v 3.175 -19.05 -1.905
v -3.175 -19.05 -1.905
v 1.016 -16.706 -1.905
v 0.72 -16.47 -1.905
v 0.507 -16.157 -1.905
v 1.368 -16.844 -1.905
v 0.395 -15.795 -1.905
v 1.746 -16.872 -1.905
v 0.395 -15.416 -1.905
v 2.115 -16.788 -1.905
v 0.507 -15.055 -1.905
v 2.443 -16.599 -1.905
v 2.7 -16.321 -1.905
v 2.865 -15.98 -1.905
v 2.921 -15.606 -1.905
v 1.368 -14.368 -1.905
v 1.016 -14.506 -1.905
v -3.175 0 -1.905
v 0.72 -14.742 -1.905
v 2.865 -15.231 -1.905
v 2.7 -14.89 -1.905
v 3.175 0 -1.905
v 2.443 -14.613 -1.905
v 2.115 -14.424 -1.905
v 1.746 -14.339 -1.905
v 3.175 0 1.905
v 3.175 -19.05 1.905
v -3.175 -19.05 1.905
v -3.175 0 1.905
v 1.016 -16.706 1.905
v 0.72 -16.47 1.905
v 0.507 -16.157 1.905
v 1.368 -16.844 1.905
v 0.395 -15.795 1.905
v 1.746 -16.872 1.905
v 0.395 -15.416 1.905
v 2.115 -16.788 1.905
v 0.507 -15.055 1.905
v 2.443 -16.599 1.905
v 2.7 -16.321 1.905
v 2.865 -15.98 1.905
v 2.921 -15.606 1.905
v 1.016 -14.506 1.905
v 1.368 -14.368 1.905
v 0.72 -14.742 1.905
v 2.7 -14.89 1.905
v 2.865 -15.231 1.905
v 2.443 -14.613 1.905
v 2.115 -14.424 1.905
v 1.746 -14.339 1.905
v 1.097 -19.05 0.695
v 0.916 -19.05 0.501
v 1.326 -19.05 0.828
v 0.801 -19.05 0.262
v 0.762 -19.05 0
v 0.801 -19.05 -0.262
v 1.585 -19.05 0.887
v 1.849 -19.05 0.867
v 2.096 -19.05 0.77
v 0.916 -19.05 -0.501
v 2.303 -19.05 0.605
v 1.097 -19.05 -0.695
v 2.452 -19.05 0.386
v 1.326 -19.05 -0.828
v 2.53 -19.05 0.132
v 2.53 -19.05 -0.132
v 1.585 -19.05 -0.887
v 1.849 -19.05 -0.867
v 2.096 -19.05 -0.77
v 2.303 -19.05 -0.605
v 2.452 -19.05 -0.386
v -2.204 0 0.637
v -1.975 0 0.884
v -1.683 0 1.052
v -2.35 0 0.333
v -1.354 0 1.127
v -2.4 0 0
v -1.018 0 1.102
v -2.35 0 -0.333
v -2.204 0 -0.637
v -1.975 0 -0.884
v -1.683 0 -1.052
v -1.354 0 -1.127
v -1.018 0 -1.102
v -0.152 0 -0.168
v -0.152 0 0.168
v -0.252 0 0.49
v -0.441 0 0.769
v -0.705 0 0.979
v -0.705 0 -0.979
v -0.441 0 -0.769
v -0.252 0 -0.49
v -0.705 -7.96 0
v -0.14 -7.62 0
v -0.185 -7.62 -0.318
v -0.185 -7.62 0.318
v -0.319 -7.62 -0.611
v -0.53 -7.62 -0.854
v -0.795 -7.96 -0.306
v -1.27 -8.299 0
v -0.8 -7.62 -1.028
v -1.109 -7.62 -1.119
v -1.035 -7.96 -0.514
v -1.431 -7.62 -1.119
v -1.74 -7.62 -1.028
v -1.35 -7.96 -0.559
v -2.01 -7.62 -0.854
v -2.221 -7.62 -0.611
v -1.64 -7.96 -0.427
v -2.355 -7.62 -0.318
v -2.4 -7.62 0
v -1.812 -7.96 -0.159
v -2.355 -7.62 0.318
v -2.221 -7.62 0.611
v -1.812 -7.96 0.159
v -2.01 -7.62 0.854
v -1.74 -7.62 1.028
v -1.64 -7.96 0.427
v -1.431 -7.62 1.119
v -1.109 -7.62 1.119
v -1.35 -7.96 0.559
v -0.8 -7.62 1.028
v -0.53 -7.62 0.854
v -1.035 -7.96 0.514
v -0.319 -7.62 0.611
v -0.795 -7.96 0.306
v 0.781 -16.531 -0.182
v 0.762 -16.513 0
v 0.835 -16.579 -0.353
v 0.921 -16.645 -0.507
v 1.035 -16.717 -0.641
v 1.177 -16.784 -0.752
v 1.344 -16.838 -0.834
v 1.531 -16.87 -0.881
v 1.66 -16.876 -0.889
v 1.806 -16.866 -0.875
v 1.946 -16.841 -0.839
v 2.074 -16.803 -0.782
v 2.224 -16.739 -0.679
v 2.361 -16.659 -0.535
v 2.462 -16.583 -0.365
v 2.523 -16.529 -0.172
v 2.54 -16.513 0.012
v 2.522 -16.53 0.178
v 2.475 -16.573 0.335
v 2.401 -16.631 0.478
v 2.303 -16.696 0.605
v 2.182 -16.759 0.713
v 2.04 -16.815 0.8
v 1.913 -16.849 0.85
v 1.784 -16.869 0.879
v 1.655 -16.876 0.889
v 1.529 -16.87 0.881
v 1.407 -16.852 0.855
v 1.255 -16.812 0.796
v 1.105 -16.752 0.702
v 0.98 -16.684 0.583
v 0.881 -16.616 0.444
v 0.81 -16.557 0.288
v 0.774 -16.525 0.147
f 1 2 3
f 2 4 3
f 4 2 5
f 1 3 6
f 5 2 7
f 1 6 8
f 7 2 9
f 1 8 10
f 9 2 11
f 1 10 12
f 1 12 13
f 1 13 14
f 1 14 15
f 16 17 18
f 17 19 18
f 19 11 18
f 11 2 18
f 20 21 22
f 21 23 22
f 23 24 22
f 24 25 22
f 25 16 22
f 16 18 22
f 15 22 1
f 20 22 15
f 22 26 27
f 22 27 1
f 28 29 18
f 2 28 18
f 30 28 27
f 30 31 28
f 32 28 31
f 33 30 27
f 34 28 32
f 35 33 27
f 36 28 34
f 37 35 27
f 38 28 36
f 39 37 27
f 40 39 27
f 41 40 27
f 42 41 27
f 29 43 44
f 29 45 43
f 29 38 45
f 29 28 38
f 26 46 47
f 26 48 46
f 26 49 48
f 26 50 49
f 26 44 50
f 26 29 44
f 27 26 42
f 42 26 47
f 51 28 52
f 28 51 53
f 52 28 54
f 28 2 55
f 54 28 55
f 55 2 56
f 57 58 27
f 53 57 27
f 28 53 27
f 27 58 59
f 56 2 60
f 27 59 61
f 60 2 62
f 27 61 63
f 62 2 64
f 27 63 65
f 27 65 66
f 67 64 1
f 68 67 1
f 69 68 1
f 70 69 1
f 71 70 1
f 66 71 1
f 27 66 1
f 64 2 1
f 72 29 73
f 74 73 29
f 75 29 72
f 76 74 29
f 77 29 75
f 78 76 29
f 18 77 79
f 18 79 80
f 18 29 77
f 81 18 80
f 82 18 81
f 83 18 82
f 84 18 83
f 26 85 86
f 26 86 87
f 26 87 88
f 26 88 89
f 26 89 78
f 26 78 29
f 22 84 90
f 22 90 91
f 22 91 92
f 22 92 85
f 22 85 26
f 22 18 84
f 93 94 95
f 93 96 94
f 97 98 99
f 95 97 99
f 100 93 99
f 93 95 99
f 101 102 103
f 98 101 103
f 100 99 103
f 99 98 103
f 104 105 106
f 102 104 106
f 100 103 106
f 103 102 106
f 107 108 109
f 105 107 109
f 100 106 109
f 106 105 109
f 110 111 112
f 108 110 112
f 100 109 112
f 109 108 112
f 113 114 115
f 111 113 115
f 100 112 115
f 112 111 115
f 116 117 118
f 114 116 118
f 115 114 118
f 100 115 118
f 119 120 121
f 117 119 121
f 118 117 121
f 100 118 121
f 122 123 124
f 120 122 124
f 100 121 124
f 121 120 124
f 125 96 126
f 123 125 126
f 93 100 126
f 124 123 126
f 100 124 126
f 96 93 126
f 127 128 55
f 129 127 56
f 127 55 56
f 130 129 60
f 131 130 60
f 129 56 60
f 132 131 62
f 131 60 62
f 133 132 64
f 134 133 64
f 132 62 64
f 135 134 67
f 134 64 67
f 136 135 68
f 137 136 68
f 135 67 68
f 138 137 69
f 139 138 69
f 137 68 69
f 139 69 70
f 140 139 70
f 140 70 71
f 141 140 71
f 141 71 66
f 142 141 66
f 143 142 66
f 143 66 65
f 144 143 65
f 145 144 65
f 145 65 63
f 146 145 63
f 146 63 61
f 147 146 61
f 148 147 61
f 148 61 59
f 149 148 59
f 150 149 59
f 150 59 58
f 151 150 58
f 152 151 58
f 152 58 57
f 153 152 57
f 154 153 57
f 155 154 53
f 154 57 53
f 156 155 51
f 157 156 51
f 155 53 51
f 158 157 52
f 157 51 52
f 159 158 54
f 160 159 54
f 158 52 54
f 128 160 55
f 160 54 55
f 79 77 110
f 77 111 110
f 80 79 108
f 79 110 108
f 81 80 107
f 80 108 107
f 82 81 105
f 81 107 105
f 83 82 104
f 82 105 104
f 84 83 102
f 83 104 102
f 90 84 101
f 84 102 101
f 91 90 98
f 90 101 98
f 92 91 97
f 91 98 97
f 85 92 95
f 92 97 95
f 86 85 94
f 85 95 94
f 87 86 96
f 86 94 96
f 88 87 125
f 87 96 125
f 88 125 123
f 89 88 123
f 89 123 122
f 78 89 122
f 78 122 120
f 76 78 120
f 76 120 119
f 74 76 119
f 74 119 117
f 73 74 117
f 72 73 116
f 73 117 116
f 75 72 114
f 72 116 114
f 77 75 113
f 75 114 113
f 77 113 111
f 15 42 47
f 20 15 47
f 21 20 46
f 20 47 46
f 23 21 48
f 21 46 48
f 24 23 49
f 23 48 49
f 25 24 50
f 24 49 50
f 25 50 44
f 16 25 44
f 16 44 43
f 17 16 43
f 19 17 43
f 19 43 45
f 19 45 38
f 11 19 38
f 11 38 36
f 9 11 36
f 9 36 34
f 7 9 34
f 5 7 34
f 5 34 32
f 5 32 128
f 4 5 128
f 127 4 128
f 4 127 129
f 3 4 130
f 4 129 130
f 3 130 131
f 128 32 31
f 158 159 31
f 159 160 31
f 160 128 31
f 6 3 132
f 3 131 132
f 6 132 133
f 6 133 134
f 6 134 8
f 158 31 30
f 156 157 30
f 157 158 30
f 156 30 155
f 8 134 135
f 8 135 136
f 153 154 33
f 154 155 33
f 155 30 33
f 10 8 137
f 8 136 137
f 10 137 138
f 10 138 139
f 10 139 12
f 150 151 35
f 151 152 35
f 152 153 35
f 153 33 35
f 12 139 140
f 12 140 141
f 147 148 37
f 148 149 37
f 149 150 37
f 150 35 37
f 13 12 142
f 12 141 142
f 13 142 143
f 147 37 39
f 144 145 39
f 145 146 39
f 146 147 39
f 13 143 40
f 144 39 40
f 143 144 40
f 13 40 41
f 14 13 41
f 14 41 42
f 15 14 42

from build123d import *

# Parameters (mm, degrees)
SKETCH1_W                  = 6.35
SKETCH1_H                  = 3.81
BOSS_EXTRUDE1_DEPTH        = 19.05
F_4_40_TAPPED_HOLE1_D      = 2.2606
F_4_40_TAPPED_HOLE1_DEPTH  = 7.62
F_4_40_TAPPED_HOLE1_TIP    = 0.679152758
SKETCH8_R                  = 1.27
CUT_EXTRUDE3_DEPTH         = 20.685
F_2_56_TAPPED_HOLE2_REACH  = 21.406
F_2_56_TAPPED_HOLE2_BORE_R = 0.889


with BuildPart() as part:
    # Sketch1 → Boss-Extrude1 (new body)
    with BuildSketch(Plane(origin=(0, 0, 0), x_dir=(1, 0, 0), z_dir=(0, 1, 0))):
        Rectangle(SKETCH1_W, SKETCH1_H)
    extrude(amount=-BOSS_EXTRUDE1_DEPTH)

    # #4-40 Tapped Hole1
    with Locations(Plane(origin=(0, 0, 0), x_dir=(1, 0, 0), z_dir=(0, 1, 0))):
        with Locations((-1.27, 0)):
            Hole(F_4_40_TAPPED_HOLE1_D / 2, depth=F_4_40_TAPPED_HOLE1_DEPTH)
            with Locations((0, 0, -(F_4_40_TAPPED_HOLE1_DEPTH + F_4_40_TAPPED_HOLE1_TIP / 2))):  # 118° drill point
                Cone(0, F_4_40_TAPPED_HOLE1_D / 2, F_4_40_TAPPED_HOLE1_TIP, mode=Mode.SUBTRACT)

    # Sketch8 → Cut-Extrude3 (cut, through all)
    with BuildSketch(Plane.XY.offset(1.905)):
        with Locations((1.651, -15.60576)):
            Circle(SKETCH8_R)
    extrude(amount=-CUT_EXTRUDE3_DEPTH, mode=Mode.SUBTRACT)

    # #2-56 Tapped Hole2 bore → #2-56 Tapped Hole2 (cut, up to next)
    with BuildSketch(Plane(origin=(0, -19.05, 0), x_dir=(-1, 0, 0), z_dir=(0, -1, 0)), mode=Mode.PRIVATE) as f_2_56_tapped_hole2_sk1:
        with Locations((-1.651, 0)):
            Circle(F_2_56_TAPPED_HOLE2_BORE_R)
    f_2_56_tapped_hole2_tool1 = extrude(f_2_56_tapped_hole2_sk1.sketch, amount=-F_2_56_TAPPED_HOLE2_REACH, mode=Mode.PRIVATE) & part.part
    add(f_2_56_tapped_hole2_tool1.solids().sort_by_distance((1.651, -19.05, 0))[0], mode=Mode.SUBTRACT)


solid = part.part
